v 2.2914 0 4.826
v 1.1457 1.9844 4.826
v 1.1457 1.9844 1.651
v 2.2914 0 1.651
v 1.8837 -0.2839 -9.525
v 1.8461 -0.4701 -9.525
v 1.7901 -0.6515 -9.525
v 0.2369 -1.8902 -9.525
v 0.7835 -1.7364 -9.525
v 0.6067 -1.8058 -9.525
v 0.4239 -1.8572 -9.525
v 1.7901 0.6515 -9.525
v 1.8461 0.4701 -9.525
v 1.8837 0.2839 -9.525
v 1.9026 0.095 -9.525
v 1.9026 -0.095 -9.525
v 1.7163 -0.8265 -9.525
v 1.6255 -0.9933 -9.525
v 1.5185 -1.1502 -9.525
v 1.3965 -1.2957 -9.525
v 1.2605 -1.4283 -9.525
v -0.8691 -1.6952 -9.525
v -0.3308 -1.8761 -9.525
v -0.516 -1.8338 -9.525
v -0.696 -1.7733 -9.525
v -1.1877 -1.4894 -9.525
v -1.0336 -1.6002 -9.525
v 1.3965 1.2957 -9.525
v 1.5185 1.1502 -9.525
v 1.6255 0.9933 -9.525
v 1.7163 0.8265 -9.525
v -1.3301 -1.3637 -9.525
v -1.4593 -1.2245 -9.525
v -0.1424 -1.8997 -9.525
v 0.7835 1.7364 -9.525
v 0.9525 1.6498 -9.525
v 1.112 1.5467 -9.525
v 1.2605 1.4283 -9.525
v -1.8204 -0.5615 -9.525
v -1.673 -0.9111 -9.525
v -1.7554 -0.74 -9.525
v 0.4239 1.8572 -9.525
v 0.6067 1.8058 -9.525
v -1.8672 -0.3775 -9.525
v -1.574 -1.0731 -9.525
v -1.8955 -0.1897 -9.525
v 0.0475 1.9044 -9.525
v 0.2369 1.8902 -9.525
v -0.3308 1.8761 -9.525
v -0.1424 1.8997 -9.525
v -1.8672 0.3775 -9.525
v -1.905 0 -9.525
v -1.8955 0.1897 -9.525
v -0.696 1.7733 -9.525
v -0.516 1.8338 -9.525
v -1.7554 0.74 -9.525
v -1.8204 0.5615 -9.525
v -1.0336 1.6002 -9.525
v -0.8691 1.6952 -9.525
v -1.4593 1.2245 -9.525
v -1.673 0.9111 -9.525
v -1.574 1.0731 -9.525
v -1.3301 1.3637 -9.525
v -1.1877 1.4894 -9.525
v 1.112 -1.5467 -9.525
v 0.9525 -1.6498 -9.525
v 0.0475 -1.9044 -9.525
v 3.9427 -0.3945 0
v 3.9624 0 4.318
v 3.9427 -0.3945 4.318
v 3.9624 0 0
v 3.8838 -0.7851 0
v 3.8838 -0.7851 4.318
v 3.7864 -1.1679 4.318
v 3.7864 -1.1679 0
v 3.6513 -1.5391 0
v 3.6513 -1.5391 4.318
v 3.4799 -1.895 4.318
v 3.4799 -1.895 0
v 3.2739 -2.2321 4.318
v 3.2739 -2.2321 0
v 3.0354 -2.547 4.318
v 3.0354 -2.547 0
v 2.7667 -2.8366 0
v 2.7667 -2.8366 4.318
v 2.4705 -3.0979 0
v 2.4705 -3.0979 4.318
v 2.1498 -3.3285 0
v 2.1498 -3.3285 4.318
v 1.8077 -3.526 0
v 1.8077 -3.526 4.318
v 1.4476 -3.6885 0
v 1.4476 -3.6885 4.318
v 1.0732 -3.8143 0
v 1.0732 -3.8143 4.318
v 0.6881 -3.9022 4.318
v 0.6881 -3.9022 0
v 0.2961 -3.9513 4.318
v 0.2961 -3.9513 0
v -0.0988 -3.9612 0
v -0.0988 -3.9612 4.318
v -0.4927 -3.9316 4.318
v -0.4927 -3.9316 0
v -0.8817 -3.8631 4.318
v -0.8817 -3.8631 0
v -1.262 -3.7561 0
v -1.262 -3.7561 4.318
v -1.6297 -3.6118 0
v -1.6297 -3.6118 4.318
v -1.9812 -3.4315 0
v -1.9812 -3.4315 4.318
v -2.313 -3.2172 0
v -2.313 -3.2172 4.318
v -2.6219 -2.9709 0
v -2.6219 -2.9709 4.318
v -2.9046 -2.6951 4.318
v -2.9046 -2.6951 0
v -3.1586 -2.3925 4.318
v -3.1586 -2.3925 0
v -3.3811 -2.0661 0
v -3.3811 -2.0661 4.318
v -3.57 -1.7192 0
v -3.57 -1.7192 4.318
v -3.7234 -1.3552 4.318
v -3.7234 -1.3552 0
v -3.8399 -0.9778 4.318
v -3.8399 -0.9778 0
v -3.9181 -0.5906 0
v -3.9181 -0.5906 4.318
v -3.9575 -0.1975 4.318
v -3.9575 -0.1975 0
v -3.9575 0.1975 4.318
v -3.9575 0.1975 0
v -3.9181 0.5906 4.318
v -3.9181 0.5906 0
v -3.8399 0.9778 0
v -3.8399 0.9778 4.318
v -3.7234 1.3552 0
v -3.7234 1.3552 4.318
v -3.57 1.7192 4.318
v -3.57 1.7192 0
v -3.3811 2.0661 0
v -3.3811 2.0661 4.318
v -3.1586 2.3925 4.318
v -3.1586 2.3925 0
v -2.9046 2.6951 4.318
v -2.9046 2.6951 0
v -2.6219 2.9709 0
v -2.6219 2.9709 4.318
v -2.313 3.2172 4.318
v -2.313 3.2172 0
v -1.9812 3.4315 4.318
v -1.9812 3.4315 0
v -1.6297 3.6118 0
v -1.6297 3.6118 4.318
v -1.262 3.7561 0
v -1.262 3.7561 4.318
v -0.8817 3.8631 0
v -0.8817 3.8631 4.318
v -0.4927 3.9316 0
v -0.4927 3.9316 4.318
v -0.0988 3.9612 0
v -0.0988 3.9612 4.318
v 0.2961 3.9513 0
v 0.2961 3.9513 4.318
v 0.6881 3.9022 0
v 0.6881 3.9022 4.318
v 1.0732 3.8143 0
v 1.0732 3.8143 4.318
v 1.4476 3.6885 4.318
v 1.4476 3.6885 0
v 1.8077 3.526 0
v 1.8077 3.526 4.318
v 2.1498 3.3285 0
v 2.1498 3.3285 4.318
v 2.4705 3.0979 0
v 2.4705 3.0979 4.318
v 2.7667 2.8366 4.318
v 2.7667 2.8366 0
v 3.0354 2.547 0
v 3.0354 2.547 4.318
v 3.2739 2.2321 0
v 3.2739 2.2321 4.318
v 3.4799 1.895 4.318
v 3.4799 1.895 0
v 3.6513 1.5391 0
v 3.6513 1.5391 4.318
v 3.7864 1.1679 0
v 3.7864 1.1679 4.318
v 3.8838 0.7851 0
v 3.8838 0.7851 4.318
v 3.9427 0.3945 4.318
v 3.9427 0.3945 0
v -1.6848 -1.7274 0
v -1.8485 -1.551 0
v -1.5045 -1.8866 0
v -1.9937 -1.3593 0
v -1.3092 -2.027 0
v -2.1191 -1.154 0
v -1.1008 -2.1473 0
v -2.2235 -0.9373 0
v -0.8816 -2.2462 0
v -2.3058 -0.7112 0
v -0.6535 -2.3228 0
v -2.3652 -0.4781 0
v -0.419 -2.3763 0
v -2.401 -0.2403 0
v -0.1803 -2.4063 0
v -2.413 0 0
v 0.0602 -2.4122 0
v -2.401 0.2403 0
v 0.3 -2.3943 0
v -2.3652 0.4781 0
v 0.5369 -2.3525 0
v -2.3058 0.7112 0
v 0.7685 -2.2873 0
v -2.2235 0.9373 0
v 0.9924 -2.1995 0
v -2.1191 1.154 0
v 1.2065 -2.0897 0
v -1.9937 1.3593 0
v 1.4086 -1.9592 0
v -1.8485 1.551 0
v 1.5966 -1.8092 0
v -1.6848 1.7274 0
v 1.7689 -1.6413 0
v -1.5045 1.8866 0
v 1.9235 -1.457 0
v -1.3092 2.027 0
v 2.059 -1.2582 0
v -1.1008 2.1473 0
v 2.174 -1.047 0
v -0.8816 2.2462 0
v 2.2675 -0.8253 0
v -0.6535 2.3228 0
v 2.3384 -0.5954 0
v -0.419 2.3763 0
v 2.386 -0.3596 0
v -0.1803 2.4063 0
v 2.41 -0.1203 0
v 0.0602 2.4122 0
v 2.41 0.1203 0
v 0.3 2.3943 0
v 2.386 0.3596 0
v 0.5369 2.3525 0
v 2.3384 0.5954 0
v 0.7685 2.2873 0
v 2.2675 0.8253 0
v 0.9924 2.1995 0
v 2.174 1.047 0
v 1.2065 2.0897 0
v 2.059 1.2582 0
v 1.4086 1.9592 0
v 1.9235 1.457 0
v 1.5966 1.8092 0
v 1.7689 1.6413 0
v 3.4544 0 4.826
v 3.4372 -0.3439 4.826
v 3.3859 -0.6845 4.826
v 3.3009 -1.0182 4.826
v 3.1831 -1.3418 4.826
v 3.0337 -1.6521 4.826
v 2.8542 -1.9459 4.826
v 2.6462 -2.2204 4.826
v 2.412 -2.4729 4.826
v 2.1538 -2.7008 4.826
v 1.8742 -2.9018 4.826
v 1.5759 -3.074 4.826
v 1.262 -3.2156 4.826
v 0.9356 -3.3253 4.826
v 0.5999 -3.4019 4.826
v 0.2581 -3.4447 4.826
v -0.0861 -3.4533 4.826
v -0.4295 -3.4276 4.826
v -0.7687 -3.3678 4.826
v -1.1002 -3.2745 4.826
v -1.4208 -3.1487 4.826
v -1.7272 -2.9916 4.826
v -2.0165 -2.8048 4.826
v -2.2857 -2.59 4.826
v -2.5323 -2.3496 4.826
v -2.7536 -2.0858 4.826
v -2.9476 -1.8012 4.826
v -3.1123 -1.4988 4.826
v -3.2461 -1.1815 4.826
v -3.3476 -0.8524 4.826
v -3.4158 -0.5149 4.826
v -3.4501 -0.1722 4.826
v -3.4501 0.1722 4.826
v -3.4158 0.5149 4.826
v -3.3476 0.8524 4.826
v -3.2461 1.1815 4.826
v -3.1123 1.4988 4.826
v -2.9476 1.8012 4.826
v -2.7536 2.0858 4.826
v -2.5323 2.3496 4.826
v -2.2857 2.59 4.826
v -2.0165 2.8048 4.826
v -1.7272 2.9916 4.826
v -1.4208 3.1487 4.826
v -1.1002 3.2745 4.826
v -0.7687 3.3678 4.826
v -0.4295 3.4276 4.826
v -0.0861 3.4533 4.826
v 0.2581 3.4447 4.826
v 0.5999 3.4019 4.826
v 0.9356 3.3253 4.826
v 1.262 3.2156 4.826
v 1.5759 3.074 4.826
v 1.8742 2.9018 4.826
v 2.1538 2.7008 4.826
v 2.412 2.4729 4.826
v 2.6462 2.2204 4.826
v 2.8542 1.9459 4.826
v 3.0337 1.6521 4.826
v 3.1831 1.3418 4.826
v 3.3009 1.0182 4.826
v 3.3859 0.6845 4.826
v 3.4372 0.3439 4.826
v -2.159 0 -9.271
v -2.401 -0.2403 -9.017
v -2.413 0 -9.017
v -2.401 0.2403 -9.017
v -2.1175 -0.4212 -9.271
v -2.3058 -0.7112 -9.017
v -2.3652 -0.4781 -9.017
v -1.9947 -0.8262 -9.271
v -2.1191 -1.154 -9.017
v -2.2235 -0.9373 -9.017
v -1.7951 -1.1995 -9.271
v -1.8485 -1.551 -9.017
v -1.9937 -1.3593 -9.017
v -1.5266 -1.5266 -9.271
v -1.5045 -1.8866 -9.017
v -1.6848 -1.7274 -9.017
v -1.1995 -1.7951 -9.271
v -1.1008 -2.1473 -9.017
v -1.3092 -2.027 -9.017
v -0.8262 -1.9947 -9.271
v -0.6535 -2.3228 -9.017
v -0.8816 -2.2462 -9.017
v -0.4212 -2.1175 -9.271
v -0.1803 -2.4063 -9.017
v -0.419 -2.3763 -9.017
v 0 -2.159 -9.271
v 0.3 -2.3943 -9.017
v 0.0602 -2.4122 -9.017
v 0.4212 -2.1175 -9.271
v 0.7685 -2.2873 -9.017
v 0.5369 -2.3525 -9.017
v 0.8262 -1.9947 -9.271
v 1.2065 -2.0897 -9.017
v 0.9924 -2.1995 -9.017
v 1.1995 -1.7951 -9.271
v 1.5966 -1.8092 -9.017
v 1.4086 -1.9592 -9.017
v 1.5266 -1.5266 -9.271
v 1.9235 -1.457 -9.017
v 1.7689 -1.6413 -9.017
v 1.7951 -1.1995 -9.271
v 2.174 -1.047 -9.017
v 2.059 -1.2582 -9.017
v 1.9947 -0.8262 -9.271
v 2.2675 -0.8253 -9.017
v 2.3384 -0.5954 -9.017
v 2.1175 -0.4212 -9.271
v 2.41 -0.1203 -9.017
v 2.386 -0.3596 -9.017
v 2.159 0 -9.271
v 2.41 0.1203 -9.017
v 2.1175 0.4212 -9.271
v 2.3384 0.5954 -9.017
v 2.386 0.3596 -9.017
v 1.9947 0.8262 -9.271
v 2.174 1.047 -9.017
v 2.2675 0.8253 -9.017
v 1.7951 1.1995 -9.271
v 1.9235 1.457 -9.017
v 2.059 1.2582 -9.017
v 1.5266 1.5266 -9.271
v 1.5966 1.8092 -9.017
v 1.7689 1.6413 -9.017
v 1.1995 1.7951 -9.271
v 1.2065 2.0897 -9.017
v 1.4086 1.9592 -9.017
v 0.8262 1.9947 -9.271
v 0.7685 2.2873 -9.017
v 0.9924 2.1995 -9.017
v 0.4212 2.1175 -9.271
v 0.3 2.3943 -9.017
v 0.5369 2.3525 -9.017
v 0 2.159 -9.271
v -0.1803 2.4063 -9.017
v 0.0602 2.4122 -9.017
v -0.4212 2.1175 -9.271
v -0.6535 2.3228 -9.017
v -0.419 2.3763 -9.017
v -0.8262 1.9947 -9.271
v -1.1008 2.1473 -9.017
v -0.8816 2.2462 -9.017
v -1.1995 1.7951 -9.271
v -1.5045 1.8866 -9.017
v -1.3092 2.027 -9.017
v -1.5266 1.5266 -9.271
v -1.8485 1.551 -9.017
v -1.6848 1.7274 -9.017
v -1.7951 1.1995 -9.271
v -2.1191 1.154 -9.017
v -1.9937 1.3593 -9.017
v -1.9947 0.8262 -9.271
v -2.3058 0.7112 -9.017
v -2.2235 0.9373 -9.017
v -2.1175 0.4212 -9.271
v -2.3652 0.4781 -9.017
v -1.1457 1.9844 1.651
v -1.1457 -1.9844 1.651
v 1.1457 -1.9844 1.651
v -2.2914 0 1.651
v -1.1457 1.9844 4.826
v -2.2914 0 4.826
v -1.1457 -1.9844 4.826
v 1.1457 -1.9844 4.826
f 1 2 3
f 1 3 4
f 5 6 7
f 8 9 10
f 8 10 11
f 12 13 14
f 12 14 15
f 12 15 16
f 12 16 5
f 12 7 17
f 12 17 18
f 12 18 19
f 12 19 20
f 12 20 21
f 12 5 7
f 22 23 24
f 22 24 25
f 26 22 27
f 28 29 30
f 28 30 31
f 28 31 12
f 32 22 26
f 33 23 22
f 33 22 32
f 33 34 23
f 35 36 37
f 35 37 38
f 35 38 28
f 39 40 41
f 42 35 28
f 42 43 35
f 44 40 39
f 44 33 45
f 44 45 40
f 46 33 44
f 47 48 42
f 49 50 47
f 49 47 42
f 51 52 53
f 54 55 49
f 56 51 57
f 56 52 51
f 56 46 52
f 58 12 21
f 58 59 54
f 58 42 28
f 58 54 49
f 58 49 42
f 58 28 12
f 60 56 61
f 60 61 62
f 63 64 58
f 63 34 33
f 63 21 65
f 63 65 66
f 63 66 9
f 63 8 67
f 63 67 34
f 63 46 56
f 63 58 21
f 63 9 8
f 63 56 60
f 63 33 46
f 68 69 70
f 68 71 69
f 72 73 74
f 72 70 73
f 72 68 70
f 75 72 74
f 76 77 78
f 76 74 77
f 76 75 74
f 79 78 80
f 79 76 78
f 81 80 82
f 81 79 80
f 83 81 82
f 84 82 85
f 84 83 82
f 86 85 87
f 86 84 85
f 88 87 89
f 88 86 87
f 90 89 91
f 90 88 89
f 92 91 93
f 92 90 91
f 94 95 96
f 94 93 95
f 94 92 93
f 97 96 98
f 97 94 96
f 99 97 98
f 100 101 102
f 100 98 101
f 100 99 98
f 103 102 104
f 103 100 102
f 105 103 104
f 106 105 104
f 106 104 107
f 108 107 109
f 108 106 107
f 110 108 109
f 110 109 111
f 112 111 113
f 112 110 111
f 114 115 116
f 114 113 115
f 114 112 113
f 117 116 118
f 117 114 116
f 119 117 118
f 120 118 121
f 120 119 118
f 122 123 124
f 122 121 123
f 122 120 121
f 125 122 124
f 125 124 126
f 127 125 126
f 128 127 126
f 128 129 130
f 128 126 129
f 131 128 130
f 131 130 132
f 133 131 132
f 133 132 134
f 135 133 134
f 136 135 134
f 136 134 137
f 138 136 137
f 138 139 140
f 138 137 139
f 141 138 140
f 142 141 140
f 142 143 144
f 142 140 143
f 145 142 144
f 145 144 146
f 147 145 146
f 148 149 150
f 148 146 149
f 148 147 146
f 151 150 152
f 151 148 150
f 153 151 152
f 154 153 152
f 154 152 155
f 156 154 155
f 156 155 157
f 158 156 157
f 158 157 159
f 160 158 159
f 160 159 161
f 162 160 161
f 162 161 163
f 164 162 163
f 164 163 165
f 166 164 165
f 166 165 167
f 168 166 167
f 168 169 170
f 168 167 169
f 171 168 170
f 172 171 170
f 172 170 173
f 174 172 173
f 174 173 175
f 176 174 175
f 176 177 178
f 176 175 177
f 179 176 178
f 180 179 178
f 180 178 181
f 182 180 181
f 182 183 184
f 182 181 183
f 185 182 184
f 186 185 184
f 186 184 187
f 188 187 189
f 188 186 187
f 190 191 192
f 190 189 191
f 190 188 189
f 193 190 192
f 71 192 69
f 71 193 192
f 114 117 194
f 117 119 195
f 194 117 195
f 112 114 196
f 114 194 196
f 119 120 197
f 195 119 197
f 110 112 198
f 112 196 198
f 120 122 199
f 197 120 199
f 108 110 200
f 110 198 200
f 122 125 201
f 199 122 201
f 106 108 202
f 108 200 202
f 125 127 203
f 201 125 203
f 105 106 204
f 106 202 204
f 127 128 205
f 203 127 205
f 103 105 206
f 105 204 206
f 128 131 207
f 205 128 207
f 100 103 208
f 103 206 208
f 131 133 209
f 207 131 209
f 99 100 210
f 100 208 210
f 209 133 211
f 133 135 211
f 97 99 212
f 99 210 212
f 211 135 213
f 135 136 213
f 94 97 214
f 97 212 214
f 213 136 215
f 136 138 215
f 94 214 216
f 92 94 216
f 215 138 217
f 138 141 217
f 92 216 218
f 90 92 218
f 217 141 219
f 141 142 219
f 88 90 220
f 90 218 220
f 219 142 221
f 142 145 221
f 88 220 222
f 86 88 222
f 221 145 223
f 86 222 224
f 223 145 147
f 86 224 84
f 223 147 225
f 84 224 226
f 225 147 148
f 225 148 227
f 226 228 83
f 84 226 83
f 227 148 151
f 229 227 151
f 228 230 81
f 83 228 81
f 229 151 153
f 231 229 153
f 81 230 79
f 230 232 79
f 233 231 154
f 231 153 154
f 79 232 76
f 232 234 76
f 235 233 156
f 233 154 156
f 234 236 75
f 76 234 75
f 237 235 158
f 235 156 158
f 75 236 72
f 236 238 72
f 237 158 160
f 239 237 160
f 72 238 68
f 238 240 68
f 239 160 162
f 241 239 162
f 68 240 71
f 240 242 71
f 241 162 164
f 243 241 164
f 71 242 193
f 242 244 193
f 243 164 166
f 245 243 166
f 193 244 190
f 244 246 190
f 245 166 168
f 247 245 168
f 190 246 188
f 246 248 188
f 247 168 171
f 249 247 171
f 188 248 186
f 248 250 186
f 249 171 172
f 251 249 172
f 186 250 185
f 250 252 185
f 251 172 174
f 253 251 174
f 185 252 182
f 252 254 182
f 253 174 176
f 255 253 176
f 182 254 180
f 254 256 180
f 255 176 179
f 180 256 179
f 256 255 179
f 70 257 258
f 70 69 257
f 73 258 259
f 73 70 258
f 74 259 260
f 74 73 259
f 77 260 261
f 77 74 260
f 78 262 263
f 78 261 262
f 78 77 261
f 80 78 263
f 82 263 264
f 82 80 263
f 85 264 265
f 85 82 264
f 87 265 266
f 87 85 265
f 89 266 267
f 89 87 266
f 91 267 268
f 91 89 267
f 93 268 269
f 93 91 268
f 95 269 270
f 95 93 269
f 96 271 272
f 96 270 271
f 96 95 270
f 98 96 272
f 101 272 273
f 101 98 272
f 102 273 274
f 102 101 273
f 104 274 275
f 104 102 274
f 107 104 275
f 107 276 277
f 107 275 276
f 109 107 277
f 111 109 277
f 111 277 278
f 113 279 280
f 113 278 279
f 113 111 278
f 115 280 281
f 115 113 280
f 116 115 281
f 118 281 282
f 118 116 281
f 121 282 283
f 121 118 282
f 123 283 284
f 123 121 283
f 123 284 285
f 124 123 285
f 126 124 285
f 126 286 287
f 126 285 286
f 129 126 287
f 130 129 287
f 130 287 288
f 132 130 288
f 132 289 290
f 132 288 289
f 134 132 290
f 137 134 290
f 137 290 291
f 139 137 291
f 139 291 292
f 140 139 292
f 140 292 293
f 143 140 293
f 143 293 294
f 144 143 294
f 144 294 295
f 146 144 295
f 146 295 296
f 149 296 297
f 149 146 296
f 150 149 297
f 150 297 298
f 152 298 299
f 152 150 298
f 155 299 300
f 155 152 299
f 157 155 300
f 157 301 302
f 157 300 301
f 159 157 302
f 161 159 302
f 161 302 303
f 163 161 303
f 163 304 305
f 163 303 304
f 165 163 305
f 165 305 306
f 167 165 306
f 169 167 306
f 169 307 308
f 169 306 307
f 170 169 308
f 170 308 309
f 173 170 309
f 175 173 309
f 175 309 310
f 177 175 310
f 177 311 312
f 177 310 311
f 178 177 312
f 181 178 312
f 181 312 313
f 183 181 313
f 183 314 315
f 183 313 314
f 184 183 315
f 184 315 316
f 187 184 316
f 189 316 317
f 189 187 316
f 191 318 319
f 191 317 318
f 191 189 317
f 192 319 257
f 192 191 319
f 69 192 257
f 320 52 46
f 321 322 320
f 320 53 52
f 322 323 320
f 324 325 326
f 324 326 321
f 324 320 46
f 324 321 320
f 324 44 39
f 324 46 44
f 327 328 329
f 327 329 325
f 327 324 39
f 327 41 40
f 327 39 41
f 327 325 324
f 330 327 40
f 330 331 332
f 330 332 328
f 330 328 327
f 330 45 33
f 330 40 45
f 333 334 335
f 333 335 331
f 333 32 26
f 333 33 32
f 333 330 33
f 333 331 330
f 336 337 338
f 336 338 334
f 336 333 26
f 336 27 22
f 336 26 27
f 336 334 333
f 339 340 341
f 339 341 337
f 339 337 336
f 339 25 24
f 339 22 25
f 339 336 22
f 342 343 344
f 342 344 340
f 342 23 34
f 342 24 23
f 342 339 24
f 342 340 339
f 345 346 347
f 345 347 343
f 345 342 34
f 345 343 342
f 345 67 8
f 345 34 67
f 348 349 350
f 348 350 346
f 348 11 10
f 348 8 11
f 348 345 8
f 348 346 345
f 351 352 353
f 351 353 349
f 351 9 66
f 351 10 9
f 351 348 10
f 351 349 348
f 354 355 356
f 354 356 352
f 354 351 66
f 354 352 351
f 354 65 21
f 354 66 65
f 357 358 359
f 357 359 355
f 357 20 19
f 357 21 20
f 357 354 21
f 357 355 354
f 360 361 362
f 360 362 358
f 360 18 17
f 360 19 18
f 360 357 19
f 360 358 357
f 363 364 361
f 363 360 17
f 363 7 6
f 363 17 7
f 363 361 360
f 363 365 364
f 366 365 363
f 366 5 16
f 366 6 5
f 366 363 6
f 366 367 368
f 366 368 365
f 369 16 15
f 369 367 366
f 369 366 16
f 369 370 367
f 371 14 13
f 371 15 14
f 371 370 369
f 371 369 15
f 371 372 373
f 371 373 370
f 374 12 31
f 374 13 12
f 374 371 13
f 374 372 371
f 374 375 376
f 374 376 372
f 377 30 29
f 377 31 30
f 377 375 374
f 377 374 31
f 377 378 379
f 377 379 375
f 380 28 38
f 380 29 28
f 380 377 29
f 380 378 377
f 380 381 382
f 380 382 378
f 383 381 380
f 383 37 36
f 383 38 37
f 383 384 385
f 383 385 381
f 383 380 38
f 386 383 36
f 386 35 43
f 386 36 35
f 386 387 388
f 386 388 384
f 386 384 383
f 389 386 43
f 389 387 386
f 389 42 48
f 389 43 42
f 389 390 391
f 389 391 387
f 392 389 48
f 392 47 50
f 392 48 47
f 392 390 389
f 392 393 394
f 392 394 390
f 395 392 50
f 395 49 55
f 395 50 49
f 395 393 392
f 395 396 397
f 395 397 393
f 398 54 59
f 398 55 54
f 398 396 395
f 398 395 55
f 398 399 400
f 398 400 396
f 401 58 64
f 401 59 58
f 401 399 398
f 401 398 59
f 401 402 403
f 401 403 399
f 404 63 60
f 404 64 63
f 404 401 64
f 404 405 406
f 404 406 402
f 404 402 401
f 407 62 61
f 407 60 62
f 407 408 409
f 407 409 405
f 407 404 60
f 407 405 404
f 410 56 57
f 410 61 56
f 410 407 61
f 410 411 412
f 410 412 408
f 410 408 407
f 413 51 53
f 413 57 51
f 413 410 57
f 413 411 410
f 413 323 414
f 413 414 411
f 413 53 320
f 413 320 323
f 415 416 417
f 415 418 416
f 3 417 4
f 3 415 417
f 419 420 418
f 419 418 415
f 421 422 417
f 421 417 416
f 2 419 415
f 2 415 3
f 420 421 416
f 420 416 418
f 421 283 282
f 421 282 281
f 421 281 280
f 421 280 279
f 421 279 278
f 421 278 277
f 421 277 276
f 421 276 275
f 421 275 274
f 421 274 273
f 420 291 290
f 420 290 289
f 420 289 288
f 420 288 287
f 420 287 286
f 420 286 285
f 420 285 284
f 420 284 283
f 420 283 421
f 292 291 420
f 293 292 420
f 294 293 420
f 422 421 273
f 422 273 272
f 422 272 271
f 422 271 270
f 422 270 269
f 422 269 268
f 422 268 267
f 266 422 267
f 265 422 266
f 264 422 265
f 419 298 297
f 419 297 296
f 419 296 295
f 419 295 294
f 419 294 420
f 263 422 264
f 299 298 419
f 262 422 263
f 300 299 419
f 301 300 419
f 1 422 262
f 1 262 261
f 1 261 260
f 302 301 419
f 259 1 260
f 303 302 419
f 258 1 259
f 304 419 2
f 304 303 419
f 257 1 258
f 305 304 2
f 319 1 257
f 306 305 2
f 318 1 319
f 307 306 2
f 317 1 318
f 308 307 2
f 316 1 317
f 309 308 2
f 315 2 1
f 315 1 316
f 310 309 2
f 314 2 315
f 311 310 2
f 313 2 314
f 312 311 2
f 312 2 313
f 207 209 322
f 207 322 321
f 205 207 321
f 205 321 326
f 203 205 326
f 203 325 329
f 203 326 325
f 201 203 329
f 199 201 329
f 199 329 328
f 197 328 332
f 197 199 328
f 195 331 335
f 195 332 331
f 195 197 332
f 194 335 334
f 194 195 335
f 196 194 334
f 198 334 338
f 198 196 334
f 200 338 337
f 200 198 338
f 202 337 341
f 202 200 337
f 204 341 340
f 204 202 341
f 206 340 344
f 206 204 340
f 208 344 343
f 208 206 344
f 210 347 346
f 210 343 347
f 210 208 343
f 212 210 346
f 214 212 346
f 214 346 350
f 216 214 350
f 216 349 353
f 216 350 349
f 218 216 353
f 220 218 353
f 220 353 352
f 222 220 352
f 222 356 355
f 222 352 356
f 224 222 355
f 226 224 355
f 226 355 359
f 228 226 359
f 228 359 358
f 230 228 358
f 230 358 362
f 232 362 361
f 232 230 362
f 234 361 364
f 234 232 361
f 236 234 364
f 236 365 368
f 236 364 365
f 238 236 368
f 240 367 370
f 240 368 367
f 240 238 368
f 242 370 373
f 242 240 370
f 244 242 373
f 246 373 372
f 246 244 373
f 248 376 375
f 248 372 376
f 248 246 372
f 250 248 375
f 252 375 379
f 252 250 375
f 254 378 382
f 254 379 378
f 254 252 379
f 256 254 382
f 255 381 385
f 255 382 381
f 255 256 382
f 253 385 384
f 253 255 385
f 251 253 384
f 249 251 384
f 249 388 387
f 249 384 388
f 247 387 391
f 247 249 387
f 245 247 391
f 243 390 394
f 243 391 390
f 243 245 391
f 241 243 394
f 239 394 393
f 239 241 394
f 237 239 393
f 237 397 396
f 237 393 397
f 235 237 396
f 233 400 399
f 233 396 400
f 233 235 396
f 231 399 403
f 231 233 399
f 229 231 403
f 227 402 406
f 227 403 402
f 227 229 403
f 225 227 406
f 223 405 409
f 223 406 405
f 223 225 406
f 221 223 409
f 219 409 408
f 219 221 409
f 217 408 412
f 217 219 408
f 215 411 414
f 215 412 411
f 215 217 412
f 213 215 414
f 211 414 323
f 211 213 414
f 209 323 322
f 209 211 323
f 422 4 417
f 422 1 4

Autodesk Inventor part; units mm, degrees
ref_plane "YZ Plane" through (0, 0, 0) normal (1, 0, 0) x (0, 1, 0)
ref_plane "XZ Plane" through (0, 0, 0) normal (0, 1, 0) x (-1, 0, 0)
ref_plane "XY Plane" through (0, 0, 0) normal (0, 0, 1) x (1, 0, 0)
sketch "Sketch1" plane through (0, 0, 0) normal (0, 0, 1) x (1, 0, 0)
  circle A0 centre (0, 0) radius 3.9624
  dimension "d0" = 7.9248
extrude "Extrusion1" add sketch "Sketch1" along normal blind 4.826
sketch "Sketch2" plane through (0, 0, 0) normal (0, 0, -1) x (-1, 0, 0)
  circle A0 centre (0, 0) radius 3.9624 projected
  circle A1 centre (0, 0) radius 2.413
  dimension "d3" = 4.826
extrude "Extrusion2" add sketch "Sketch2" along normal blind 9.525 contours A1
sketch "Sketch3" plane through (0, 0, 4.826) normal (0, 0, 1) x (1, 0, 0)
  circle A0 centre (0, 0) radius 3.9624 projected
  line L0 (-1.1457, 1.9844) -> (1.1457, 1.9844)
  line L1 (1.1457, 1.9844) -> (2.2914, 0)
  line L2 (2.2914, 0) -> (1.1457, -1.9844)
  line L3 (1.1457, -1.9844) -> (-1.1457, -1.9844)
  line L4 (-1.1457, -1.9844) -> (-2.2914, 0)
  line L5 (-2.2914, 0) -> (-1.1457, 1.9844)
  dimension "d6" = 3.9688
extrude "Extrusion3" cut sketch "Sketch3" against normal blind 3.175 contours L0 L1 L2 L3 L4 L5
thread "Thread1" size "10-32 UNF" class "2A" standard "ANSI Unified Screw Threads" full length
chamfer "Chamfer1" distance 0.508 angle 45 1 edges at (2.413, 0, -9.525)
chamfer "Chamfer2" distance 0.508 angle 45 1 edges at (-3.9624, 0, 4.826)
properties part number "10-32 x1000" material "Steel"
